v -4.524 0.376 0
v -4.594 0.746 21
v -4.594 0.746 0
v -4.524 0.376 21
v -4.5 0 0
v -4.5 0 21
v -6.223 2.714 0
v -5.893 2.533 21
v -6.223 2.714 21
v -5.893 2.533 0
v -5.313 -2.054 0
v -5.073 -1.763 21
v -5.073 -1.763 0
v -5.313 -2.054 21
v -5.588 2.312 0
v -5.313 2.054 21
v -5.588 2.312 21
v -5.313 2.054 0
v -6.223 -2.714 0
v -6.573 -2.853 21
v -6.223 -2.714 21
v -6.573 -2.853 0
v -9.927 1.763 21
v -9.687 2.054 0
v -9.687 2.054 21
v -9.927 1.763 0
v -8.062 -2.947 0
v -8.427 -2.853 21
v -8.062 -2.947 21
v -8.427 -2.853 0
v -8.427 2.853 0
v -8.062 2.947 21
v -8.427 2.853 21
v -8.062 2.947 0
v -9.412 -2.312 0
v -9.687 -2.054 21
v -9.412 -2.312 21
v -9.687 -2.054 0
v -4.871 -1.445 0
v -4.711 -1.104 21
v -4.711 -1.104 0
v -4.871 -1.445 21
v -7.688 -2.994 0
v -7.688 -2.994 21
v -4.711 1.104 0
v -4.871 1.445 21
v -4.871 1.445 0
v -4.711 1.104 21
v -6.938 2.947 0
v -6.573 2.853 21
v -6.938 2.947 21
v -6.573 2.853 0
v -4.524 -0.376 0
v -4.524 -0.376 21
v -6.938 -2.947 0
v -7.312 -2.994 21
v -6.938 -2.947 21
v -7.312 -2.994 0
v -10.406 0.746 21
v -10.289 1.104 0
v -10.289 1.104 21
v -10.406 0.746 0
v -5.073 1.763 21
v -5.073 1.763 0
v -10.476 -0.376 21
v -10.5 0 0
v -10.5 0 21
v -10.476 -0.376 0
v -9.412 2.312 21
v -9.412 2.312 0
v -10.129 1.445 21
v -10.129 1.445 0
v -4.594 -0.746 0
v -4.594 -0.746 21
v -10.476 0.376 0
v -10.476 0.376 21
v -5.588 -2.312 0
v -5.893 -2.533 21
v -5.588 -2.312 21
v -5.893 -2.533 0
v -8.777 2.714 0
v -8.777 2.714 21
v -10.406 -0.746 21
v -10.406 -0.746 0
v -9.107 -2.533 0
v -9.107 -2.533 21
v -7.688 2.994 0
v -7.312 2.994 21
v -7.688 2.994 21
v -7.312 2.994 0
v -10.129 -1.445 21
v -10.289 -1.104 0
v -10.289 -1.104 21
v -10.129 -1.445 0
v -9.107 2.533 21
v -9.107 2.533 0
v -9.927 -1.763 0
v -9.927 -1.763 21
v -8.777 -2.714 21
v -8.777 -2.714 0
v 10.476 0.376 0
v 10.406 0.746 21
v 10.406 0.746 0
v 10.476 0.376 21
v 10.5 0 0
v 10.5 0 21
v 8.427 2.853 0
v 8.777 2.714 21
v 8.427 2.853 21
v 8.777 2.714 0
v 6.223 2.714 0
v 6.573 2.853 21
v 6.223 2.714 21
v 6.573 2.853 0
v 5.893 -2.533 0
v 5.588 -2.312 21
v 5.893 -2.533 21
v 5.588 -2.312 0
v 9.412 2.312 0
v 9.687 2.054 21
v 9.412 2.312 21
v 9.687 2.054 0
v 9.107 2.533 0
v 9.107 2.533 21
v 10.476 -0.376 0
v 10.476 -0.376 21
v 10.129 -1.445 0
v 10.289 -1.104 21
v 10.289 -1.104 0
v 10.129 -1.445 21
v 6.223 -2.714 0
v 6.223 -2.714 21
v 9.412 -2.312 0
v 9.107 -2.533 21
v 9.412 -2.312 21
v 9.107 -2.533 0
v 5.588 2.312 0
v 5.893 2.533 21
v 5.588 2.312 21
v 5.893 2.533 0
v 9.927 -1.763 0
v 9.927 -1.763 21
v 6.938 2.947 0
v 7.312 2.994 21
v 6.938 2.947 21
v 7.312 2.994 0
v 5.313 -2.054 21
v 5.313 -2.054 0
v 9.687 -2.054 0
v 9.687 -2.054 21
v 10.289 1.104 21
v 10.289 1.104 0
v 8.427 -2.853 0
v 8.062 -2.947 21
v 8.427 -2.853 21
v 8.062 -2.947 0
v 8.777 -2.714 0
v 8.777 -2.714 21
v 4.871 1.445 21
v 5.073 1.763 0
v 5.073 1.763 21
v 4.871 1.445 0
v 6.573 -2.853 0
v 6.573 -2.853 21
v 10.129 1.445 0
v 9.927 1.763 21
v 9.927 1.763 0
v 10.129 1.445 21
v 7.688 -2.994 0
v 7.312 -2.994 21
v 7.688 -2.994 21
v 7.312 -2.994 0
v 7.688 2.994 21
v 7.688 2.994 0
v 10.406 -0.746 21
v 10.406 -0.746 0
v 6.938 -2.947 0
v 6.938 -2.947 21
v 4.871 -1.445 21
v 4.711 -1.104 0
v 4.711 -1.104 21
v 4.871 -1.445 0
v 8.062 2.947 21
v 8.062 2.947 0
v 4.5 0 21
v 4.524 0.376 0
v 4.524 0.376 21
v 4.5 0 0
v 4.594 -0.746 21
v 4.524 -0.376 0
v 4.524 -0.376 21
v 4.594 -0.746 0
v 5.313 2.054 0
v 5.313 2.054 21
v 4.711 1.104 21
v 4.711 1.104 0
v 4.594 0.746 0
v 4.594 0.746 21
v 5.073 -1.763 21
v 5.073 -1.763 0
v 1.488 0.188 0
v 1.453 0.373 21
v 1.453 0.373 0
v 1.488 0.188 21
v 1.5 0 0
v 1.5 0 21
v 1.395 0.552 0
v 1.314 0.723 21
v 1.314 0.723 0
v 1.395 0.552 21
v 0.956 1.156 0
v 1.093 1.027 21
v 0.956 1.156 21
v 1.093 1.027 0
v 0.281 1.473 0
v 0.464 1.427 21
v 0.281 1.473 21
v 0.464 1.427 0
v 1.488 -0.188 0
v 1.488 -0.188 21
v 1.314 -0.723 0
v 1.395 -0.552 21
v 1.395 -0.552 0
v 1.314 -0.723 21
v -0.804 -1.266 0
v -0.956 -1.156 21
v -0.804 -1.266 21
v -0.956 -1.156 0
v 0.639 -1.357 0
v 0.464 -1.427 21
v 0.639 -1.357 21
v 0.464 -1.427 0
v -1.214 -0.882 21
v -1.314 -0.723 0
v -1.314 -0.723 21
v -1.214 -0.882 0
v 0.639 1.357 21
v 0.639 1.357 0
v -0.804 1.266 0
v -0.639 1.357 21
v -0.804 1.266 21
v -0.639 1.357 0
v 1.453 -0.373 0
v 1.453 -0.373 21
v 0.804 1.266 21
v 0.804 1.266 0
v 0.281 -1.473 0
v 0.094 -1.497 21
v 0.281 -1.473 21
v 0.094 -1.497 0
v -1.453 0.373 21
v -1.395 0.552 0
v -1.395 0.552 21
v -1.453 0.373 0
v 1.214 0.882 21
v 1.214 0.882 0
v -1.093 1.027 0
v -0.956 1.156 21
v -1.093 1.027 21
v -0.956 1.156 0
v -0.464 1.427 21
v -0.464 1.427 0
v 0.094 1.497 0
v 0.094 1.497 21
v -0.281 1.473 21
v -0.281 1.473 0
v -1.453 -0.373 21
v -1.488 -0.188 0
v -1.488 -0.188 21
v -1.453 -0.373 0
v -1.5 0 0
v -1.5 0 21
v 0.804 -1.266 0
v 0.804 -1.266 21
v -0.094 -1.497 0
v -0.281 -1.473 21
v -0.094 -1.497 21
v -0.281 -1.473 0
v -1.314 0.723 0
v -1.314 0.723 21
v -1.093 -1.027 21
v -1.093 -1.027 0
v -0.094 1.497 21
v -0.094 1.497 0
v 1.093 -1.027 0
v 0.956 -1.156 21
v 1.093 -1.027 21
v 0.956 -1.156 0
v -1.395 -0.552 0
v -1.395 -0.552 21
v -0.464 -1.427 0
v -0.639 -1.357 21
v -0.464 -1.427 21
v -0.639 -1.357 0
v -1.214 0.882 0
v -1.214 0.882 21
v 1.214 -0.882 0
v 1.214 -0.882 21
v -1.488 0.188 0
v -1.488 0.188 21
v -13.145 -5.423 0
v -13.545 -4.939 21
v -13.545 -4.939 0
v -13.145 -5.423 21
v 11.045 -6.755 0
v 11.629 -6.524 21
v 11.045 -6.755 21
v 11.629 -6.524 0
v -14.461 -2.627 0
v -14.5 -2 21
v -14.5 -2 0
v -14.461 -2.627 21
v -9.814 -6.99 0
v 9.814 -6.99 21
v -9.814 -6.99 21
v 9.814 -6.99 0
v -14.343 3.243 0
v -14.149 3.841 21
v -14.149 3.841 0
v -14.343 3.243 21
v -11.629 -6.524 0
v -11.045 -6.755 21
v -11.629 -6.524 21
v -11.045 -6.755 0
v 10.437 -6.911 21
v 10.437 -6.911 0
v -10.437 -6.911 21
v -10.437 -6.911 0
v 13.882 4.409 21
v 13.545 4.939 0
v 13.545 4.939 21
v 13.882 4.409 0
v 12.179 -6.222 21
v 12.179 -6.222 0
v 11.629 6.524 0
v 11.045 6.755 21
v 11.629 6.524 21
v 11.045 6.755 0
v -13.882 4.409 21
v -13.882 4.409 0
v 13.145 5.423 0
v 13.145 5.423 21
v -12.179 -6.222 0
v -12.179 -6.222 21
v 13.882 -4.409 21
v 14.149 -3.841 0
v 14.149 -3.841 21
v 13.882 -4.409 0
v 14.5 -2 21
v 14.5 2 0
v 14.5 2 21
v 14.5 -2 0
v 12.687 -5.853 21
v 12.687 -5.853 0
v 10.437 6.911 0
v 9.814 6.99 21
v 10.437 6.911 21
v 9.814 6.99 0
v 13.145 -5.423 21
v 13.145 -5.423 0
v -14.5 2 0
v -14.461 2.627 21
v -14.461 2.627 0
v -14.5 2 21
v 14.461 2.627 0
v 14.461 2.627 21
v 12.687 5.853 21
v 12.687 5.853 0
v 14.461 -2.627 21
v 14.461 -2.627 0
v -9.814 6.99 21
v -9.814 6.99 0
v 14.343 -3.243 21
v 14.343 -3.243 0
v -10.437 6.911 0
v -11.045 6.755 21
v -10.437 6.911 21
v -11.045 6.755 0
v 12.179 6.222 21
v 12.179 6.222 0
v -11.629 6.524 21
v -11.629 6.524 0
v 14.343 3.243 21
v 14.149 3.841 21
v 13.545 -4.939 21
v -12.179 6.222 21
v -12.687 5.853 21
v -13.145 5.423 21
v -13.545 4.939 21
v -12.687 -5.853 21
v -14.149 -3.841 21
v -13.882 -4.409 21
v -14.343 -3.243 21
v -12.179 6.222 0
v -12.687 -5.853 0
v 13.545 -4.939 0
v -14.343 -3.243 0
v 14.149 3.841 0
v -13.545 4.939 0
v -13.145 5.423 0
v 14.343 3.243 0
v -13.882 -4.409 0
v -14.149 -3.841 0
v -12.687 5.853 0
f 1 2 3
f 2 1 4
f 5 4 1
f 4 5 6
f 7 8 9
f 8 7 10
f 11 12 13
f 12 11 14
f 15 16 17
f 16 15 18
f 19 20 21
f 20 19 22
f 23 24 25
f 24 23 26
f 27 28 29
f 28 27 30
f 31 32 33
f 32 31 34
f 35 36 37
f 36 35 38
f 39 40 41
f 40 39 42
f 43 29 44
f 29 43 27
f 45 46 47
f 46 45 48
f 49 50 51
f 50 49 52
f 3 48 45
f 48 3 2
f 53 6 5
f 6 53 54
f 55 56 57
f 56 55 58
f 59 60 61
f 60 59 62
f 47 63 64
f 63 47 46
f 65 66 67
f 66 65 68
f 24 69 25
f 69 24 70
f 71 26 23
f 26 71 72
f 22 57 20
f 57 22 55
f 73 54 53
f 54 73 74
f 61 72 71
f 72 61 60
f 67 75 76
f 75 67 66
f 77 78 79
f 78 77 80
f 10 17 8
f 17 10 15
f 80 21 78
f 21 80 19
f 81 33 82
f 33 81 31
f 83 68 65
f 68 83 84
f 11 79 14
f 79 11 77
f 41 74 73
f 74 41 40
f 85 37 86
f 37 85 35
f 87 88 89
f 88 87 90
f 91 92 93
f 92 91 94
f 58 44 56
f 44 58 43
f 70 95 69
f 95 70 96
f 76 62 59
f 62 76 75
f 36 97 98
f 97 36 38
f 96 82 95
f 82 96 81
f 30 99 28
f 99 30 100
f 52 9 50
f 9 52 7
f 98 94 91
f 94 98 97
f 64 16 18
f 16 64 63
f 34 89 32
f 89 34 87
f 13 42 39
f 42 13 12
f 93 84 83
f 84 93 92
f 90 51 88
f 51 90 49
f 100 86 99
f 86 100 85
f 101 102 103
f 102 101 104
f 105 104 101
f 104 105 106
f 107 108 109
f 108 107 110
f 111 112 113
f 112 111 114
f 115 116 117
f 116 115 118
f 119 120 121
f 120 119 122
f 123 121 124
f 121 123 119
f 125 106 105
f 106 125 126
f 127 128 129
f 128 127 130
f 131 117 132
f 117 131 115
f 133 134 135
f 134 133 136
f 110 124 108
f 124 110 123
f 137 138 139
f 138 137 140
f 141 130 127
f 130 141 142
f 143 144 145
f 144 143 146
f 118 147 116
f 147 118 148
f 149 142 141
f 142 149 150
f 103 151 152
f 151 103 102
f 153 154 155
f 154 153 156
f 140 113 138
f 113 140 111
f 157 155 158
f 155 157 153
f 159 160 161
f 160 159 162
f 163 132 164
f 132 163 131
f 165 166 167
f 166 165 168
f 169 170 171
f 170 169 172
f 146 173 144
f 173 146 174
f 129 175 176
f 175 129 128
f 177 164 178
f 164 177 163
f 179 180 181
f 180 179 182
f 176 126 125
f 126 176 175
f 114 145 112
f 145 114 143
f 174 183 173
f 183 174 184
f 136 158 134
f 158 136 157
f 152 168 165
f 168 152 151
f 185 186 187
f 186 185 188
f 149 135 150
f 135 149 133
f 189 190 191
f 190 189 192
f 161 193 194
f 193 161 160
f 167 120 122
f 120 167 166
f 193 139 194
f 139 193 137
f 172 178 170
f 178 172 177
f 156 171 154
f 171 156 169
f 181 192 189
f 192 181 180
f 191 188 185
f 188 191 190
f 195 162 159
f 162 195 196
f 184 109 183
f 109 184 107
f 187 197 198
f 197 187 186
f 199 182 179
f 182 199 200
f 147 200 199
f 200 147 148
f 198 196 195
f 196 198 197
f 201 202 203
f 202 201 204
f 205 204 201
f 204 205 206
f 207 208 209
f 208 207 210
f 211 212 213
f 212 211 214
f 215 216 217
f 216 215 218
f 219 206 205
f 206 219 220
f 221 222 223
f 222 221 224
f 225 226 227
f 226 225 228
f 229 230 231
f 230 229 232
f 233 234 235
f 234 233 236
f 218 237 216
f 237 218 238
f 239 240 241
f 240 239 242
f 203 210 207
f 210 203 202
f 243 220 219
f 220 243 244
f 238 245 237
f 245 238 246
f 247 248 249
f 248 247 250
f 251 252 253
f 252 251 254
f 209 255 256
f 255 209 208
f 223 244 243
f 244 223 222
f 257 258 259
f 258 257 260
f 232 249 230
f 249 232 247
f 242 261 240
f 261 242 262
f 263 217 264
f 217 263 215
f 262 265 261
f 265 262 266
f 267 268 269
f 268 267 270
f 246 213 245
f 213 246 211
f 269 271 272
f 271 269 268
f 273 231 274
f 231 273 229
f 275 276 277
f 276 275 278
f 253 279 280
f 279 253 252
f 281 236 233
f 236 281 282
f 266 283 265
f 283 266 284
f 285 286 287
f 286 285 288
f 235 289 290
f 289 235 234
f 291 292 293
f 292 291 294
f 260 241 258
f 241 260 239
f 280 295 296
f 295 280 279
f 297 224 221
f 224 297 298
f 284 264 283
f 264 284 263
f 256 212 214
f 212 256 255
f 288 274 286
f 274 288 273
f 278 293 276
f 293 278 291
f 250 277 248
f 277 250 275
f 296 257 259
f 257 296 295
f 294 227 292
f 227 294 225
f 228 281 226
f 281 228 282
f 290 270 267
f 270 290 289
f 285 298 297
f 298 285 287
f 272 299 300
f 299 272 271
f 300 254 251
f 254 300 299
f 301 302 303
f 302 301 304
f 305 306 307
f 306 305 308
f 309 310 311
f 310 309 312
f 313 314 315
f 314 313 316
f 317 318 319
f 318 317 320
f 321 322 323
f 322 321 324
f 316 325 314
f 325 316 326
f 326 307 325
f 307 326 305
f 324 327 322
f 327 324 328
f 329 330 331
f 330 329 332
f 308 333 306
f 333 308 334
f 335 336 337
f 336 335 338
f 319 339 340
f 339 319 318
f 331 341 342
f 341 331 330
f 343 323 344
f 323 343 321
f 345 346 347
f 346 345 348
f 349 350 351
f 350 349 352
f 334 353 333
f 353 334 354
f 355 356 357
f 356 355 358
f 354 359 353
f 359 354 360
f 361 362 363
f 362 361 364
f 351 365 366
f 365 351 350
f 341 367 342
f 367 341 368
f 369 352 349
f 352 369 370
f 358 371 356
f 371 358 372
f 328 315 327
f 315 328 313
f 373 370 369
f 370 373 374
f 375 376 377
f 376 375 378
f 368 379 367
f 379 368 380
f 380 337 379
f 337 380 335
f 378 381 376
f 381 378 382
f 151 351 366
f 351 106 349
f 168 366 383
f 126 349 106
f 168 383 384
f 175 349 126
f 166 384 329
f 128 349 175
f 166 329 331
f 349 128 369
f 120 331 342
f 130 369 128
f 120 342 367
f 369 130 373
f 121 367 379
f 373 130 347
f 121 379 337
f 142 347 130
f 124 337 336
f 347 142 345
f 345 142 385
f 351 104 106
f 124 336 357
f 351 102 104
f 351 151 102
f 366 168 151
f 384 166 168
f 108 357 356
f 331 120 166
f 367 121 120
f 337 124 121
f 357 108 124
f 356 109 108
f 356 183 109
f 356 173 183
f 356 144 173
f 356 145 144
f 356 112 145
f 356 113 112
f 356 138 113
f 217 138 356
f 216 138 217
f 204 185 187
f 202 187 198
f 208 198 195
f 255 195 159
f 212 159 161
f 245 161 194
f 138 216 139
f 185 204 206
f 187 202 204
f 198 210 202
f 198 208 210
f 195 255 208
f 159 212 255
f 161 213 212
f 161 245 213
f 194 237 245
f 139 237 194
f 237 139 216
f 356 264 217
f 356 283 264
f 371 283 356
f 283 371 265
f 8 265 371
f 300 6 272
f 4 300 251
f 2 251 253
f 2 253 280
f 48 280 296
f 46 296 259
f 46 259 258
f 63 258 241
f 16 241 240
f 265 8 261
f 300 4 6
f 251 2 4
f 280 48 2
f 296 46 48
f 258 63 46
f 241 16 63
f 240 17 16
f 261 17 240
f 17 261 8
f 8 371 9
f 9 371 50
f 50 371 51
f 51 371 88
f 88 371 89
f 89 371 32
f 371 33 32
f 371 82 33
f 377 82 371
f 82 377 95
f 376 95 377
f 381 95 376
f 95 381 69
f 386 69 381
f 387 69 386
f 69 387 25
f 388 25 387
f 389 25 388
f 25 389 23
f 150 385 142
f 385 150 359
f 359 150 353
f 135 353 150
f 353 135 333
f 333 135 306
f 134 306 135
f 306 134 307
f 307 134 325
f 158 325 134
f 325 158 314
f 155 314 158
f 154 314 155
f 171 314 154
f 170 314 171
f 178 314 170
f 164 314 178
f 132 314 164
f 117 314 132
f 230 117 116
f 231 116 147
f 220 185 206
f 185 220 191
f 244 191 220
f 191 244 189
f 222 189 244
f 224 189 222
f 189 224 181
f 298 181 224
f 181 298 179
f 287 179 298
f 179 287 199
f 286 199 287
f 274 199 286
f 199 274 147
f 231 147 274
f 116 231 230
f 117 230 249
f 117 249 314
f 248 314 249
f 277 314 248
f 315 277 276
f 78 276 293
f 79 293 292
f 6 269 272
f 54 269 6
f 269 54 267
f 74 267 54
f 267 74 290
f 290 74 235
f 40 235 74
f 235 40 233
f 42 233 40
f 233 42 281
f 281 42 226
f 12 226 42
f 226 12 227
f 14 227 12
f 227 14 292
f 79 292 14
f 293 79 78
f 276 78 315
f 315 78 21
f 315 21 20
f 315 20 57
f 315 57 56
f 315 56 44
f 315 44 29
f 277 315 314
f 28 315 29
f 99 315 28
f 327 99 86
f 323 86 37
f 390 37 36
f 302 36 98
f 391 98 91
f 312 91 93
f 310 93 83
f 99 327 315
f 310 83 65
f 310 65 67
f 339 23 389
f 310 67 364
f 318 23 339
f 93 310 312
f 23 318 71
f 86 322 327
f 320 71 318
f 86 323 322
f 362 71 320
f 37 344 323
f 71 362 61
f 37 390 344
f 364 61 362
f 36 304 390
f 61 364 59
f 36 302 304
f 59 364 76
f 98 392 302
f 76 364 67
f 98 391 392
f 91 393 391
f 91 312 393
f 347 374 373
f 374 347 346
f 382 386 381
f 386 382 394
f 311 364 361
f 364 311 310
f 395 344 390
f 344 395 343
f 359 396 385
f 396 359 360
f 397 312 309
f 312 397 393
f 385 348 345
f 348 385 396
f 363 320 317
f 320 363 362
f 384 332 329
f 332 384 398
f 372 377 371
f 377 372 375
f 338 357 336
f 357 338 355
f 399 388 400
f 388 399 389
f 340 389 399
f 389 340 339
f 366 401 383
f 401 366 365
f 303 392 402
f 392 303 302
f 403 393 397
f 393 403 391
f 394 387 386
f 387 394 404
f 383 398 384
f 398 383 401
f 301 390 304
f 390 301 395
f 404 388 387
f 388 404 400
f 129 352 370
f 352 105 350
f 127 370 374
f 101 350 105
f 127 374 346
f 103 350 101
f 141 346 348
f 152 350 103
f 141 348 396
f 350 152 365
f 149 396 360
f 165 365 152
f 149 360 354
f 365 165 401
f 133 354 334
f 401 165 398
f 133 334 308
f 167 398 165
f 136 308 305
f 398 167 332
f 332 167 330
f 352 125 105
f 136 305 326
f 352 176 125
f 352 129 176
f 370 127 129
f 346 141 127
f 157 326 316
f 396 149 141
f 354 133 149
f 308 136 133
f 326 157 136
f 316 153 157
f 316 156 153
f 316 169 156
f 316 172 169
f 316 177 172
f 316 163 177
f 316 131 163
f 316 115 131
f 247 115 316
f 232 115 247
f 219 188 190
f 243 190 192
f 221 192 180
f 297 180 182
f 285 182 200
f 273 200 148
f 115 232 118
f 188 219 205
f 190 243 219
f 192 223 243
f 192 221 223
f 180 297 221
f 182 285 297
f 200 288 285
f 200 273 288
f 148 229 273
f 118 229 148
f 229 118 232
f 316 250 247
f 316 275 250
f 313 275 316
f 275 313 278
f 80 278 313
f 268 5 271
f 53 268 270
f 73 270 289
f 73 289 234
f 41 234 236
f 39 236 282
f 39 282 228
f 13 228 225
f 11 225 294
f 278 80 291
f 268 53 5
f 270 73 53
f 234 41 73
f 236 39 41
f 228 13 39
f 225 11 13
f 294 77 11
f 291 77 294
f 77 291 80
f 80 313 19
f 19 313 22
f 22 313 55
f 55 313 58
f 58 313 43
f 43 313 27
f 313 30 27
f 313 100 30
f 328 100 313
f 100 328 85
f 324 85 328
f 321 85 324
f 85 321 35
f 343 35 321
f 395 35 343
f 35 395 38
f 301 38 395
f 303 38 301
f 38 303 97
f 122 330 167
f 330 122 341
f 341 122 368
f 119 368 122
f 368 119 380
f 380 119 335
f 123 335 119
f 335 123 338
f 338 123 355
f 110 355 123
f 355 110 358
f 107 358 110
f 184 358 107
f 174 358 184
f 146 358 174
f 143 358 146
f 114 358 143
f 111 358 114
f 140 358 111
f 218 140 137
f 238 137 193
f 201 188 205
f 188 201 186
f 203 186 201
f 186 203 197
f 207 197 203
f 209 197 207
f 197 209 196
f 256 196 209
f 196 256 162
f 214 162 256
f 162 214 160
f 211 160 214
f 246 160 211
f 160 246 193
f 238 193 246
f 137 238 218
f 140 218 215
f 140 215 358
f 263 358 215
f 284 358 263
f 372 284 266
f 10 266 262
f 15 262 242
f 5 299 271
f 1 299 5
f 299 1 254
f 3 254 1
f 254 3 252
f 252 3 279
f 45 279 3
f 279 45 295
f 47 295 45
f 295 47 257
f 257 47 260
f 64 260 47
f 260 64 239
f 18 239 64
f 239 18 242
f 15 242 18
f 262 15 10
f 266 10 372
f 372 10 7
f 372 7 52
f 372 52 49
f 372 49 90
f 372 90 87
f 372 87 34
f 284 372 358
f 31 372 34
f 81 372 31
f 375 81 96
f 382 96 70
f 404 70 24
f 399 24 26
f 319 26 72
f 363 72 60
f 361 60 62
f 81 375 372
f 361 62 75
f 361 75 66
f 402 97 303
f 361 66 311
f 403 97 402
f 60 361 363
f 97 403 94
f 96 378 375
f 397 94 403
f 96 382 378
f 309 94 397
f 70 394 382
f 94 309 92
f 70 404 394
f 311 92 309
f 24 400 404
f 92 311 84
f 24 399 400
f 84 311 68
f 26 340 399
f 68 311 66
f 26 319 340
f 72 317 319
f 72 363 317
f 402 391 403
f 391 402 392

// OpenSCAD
$fn = 50;


difference() {
	union() {
		hull() {
			translate(v = [-9.5000000000, 2.0000000000, 0]) {
				cylinder(h = 21, r = 5);
			}
			translate(v = [9.5000000000, 2.0000000000, 0]) {
				cylinder(h = 21, r = 5);
			}
			translate(v = [-9.5000000000, -2.0000000000, 0]) {
				cylinder(h = 21, r = 5);
			}
			translate(v = [9.5000000000, -2.0000000000, 0]) {
				cylinder(h = 21, r = 5);
			}
		}
	}
	union() {
		translate(v = [-7.5000000000, 0.0000000000, 0]) {
			translate(v = [0, 0, -100]) {
				cylinder(h = 200, r = 3.0000000000);
			}
		}
		translate(v = [7.5000000000, 0.0000000000, 0]) {
			translate(v = [0, 0, -100]) {
				cylinder(h = 200, r = 3.0000000000);
			}
		}
		translate(v = [-7.5000000000, 0.0000000000, 0]) {
			translate(v = [0, 0, -100]) {
				cylinder(h = 200, r = 1.5000000000);
			}
		}
		translate(v = [0, 0, -100]) {
			cylinder(h = 200, r = 1.5000000000);
		}
		translate(v = [7.5000000000, 0.0000000000, 0]) {
			translate(v = [0, 0, -100]) {
				cylinder(h = 200, r = 1.5000000000);
			}
		}
	}
}
